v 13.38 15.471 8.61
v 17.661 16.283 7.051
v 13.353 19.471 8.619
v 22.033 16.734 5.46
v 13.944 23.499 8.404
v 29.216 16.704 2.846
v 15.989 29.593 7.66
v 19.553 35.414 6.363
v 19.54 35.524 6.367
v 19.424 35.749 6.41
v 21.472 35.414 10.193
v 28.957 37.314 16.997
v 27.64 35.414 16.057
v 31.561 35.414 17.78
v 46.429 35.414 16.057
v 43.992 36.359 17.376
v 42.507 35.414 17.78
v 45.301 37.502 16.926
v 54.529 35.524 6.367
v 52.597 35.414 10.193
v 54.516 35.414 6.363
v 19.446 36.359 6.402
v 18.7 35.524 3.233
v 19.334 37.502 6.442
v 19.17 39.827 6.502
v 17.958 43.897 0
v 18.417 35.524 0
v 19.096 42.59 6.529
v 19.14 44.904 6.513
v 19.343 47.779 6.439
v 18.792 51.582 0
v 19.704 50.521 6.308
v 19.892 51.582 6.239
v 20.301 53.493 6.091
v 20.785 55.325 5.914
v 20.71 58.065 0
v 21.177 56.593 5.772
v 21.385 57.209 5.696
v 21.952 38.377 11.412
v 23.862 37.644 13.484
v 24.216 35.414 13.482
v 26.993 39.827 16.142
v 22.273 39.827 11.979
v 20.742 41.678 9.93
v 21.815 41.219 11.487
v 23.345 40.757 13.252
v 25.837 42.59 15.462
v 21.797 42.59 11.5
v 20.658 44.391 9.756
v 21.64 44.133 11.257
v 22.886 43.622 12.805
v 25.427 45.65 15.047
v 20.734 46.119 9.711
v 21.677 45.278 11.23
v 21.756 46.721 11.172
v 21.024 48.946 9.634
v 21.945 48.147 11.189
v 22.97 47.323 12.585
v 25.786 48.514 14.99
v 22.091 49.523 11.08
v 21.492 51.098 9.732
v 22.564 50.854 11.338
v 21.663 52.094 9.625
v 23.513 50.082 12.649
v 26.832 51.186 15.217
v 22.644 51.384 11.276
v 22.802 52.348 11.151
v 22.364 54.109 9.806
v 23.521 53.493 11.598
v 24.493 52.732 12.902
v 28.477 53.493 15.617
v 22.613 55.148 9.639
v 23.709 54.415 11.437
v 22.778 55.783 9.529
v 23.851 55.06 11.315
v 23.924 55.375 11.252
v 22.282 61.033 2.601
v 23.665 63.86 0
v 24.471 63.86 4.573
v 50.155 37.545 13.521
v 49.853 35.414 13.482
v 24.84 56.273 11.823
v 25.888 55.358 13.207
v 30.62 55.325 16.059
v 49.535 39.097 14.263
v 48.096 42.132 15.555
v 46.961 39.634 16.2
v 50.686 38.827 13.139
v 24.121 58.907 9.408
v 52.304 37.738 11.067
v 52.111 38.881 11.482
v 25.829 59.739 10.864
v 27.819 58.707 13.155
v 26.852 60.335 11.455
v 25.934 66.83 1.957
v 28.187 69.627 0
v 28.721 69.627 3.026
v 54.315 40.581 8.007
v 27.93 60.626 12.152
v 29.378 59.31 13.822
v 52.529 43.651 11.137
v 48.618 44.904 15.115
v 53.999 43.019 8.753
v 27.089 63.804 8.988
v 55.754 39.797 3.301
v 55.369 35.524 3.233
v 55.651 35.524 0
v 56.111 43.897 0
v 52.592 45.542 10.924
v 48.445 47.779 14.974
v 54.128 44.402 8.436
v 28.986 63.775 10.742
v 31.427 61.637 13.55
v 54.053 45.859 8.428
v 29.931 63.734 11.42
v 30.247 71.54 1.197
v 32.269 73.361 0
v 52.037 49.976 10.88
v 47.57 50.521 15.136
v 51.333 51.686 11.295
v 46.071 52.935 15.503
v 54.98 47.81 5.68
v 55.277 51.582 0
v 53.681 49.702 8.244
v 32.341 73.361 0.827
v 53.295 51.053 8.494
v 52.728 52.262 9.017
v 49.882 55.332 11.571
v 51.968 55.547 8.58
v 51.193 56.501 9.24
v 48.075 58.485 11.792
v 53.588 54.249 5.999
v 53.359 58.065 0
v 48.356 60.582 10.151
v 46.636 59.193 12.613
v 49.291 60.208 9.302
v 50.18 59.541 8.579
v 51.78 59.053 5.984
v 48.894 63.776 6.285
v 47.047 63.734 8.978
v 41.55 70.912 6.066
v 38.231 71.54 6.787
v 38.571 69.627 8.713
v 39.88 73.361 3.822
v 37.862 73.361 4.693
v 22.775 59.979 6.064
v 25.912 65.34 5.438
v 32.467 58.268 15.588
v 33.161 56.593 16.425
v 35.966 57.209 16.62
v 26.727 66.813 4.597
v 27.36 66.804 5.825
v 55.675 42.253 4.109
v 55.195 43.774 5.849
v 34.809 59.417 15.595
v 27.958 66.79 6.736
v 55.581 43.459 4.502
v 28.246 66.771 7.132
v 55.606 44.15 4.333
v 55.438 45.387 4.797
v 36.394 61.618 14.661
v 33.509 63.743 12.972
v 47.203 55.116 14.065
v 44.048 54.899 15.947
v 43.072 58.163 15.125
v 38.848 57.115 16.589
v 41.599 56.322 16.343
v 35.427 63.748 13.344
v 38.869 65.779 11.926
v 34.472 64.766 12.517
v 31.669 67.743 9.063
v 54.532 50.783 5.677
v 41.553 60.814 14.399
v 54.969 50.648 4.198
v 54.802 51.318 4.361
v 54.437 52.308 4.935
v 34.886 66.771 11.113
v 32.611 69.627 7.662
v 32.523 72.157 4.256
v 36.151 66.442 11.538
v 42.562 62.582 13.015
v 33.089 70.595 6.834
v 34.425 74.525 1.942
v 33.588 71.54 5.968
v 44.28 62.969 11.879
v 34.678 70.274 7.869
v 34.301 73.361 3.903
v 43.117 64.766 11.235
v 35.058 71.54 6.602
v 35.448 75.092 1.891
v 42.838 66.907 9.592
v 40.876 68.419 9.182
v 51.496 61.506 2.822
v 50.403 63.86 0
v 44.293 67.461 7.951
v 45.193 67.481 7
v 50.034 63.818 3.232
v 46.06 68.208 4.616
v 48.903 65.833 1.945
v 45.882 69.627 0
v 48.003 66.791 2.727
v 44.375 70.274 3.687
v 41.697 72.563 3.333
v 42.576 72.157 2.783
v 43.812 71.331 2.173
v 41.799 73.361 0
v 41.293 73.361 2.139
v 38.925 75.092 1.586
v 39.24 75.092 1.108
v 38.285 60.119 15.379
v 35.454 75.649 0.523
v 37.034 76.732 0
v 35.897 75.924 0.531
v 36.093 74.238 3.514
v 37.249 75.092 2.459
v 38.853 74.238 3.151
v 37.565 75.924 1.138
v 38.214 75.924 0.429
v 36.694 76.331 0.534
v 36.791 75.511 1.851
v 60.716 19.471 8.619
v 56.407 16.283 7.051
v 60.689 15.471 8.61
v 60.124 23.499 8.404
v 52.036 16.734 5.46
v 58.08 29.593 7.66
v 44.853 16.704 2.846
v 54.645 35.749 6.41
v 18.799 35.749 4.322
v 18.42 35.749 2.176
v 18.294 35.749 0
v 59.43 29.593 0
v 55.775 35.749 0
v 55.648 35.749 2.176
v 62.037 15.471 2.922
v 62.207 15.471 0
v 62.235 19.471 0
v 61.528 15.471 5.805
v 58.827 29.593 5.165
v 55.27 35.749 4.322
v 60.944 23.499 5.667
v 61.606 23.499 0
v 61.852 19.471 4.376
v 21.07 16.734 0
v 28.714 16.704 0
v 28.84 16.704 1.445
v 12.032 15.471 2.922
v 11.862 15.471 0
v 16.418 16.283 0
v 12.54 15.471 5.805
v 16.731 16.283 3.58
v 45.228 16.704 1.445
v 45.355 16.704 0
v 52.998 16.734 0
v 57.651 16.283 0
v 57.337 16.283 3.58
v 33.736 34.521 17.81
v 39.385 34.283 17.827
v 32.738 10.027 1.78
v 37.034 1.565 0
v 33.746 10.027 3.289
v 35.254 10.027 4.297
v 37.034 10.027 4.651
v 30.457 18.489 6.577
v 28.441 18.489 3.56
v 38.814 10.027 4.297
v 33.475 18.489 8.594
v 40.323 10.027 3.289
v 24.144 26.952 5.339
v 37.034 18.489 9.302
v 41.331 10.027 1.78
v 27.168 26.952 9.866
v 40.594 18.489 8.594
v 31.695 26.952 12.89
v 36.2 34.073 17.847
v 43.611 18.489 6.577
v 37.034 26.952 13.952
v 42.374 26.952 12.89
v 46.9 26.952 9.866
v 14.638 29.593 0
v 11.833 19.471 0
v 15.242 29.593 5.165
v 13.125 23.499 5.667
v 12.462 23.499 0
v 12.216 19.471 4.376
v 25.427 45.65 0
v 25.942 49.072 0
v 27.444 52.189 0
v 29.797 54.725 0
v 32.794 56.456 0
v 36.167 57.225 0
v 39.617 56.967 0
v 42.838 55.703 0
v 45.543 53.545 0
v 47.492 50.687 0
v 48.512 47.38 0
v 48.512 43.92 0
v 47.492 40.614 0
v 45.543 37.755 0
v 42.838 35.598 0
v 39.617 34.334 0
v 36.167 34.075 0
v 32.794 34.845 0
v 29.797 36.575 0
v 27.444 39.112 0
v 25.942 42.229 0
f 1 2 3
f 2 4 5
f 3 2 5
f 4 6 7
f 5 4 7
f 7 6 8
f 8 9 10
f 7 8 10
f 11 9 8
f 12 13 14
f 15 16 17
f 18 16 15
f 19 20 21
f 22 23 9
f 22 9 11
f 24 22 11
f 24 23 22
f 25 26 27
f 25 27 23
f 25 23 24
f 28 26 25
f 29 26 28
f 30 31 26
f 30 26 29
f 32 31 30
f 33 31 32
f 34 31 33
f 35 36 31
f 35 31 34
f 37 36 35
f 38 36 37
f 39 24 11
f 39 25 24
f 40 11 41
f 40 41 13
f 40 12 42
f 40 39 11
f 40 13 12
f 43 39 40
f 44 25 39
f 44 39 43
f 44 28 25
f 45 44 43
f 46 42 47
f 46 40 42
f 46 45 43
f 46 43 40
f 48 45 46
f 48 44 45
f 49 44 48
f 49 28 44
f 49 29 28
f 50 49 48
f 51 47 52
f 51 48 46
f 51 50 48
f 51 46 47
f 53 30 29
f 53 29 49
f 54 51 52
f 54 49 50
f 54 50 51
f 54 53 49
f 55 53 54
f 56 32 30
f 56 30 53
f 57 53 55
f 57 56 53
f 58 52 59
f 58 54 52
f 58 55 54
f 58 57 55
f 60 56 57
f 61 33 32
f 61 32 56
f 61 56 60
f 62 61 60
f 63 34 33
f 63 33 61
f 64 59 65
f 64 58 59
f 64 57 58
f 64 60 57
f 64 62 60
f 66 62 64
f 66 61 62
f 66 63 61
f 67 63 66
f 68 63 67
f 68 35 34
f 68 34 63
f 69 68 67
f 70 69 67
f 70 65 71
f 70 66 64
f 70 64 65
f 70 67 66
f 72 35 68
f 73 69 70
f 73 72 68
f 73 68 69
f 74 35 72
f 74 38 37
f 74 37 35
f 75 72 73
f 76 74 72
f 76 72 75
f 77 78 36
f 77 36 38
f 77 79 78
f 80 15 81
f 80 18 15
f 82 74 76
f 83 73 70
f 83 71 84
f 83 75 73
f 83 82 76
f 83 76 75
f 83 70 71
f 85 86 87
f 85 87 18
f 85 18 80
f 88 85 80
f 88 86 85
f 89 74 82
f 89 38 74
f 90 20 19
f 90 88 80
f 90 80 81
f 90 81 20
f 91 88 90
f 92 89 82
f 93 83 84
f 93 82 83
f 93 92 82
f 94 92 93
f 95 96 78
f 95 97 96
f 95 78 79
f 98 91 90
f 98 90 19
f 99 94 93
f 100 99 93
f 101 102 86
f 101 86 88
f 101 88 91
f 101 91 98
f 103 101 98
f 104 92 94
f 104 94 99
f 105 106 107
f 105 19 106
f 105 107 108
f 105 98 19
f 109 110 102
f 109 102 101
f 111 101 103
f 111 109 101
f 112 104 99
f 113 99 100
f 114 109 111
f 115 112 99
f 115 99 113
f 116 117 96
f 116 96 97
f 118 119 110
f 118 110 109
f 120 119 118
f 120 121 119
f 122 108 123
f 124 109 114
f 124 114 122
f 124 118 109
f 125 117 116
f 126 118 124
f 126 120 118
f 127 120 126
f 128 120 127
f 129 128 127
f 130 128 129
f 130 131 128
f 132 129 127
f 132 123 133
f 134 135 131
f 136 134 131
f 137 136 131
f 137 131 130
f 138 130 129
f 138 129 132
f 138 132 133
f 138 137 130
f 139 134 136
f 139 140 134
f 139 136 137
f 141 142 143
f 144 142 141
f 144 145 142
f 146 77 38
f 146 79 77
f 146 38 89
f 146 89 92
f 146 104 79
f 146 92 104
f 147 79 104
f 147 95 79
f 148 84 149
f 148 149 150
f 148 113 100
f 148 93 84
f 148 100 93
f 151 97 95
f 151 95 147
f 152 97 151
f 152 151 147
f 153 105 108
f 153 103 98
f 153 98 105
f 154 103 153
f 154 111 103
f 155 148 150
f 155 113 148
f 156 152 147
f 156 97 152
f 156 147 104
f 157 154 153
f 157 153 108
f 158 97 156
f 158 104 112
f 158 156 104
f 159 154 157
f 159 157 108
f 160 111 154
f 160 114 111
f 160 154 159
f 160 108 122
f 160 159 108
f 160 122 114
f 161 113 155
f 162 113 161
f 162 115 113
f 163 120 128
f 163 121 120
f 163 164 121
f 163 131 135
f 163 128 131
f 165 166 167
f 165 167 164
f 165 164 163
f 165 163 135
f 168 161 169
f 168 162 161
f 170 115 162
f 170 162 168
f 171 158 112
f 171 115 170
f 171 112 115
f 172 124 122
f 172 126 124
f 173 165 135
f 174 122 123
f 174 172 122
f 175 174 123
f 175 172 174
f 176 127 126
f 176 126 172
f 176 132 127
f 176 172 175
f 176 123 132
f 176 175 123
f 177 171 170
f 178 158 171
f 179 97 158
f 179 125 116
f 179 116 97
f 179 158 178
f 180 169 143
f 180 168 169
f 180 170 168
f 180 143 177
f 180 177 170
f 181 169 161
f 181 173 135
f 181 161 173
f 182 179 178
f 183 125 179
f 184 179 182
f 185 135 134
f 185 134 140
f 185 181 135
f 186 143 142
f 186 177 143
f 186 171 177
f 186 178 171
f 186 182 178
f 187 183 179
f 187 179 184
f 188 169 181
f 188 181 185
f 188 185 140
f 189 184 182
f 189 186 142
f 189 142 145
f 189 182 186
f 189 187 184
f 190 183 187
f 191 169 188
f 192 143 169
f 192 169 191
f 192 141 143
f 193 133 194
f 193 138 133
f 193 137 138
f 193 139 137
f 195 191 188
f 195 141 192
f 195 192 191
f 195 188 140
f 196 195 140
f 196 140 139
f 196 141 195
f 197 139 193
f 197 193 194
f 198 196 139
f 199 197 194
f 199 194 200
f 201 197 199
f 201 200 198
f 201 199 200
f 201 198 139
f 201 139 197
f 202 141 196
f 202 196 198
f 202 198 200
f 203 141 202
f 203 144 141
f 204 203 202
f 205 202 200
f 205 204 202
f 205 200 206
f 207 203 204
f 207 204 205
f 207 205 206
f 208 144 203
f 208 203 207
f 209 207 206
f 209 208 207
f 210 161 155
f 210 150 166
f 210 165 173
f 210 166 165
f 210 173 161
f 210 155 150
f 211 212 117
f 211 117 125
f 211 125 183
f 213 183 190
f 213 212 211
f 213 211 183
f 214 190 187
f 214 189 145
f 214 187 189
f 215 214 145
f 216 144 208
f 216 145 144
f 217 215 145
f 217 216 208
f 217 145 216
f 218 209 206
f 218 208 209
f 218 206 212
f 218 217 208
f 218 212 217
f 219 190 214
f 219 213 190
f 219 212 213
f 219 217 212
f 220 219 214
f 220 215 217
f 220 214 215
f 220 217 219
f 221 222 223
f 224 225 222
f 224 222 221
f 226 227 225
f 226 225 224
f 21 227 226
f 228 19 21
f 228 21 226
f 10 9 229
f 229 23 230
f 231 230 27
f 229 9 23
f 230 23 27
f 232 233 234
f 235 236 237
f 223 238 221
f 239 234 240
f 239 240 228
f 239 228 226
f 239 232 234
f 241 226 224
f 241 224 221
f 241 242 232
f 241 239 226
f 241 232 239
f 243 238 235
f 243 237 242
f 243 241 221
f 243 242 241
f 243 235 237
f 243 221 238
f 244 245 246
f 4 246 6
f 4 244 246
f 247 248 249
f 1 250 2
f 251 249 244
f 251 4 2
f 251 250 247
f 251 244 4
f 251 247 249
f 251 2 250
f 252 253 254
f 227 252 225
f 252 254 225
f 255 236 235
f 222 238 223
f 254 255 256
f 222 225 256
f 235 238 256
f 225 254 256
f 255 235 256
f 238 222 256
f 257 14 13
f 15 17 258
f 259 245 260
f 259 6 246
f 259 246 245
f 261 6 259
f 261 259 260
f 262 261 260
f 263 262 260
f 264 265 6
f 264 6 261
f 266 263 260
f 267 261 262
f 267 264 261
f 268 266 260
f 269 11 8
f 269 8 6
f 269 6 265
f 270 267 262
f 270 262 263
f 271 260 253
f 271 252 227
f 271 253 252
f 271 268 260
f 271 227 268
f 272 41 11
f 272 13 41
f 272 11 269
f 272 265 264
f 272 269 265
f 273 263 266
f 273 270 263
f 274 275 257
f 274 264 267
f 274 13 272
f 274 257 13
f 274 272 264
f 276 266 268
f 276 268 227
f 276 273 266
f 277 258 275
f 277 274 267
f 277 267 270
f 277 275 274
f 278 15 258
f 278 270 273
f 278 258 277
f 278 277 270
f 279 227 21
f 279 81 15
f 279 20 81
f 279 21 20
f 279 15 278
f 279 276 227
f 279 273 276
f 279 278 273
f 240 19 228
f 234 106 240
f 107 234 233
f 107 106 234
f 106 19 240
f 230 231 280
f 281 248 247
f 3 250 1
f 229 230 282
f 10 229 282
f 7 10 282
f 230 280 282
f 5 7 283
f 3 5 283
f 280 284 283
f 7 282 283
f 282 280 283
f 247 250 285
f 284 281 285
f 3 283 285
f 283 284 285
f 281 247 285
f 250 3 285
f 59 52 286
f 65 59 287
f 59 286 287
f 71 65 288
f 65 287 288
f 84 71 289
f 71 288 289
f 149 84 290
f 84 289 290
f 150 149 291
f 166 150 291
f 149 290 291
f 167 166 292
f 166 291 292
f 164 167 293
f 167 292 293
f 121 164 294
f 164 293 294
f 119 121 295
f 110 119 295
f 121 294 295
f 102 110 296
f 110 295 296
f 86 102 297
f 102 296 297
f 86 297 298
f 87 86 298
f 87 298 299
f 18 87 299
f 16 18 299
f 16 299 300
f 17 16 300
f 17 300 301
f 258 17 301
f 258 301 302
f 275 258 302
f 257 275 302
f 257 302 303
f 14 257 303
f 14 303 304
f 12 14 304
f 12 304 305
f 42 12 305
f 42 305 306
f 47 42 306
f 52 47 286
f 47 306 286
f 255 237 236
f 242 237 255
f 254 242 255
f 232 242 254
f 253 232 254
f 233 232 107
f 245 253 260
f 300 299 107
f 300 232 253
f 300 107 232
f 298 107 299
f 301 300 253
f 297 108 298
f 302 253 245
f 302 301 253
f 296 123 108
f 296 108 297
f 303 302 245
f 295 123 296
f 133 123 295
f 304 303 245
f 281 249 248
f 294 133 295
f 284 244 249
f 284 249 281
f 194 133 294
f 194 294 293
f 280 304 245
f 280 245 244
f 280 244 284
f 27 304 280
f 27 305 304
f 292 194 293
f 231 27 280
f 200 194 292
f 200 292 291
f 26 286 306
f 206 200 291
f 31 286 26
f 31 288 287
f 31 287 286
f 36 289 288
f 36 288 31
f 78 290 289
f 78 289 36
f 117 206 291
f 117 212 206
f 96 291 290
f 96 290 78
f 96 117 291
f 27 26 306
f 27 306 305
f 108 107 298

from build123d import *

# Parameters (mm, degrees)
REVOLVE1_ANGLE           = 180
SKETCH2_R                = 11.607478401
CUT_EXTRUDE1_DEPTH       = 30
REVOLVE3_ANGLE           = 20
REVOLVE3_OTHER_WAY_ANGLE = 20
SKETCH6_W                = 87.695776886
SKETCH6_H                = 110.7877302
CUT_EXTRUDE2_DEPTH       = 30


with BuildPart() as part:
    # Sketch1 → Revolve1 (revolve)
    with BuildSketch(Plane.XY):
        with BuildLine():
            Line((37.03427234, 1.564642505), (18.431130492, 35.41414573))
            add(Edge.make_bspline(
                [(18.431130492, 35.41414573), (14.894772629, 62.905623644), (37.03427234, 76.73235426)],
                knots=[0, 0, 0, 1, 1, 1], degree=2))
            Line((37.03427234, 76.73235426), (37.03427234, 57.257883484))
            ThreePointArc((37.03427234, 57.257883484), (25.426793939, 45.650405083), (37.03427234, 34.042926682))
            Line((37.03427234, 34.042926682), (37.03427234, 1.564642505))
        make_face()
    revolve(axis=Axis((37.03427234, 57.257883484, 0), (0, 1, 0)), revolution_arc=REVOLVE1_ANGLE)

    # Sketch2 → Cut-Extrude1 (cut)
    with BuildSketch(Plane(origin=(0, 0, 0), x_dir=(-1, 0, 0), z_dir=(0, 0, -1))):
        with Locations((-37.03427234, 45.650405083)):
            Circle(SKETCH2_R)
    extrude(amount=-CUT_EXTRUDE1_DEPTH, mode=Mode.SUBTRACT)

    # Sketch3 → Revolve3 (revolve)
    with BuildSketch(Plane(origin=(0, 0, 0), x_dir=(-1, 0, 0), z_dir=(0, 0, -1))):
        with BuildLine():
            Line((-55.774902941, 35.7486794), (-45.306584566, 16.700962649))
            add(Edge.make_bspline(
                [(-45.306584566, 16.700962649), (-54.069804725, 17.26279972), (-62.206909853, 15.470822713)],
                knots=[0, 0, 0, 0.385925107, 0.385925107, 0.385925107], degree=2))
            add(Edge.make_bspline(
                [(-55.774902941, 35.7486794), (-63.0996884, 25.437145822), (-62.206909853, 15.470822713)],
                knots=[0, 0, 0, 0.565089792, 0.565089792, 0.565089792], degree=2))
        make_face()
        with BuildLine():
            Line((-18.293641739, 35.7486794), (-28.761960114, 16.700962649))
            add(Edge.make_bspline(
                [(-28.761960114, 16.700962649), (-19.998739955, 17.26279972), (-11.861634828, 15.470822713)],
                knots=[0, 0, 0, 0.385925107, 0.385925107, 0.385925107], degree=2))
            add(Edge.make_bspline(
                [(-18.293641739, 35.7486794), (-10.96885628, 25.437145822), (-11.861634828, 15.470822713)],
                knots=[0, 0, 0, 0.565089792, 0.565089792, 0.565089792], degree=2))
        make_face()
    revolve(axis=Axis((37.03427234, 76.73235426, 0), (0, -1, 0)), revolution_arc=REVOLVE3_ANGLE)

    # Sketch3 → Revolve3 other way (revolve)
    with BuildSketch(Plane(origin=(0, 0, 0), x_dir=(-1, 0, 0), z_dir=(0, 0, -1))):
        with BuildLine():
            Line((-55.774902941, 35.7486794), (-45.306584566, 16.700962649))
            add(Edge.make_bspline(
                [(-45.306584566, 16.700962649), (-54.069804725, 17.26279972), (-62.206909853, 15.470822713)],
                knots=[0, 0, 0, 0.385925107, 0.385925107, 0.385925107], degree=2))
            add(Edge.make_bspline(
                [(-55.774902941, 35.7486794), (-63.0996884, 25.437145822), (-62.206909853, 15.470822713)],
                knots=[0, 0, 0, 0.565089792, 0.565089792, 0.565089792], degree=2))
        make_face()
        with BuildLine():
            Line((-18.293641739, 35.7486794), (-28.761960114, 16.700962649))
            add(Edge.make_bspline(
                [(-28.761960114, 16.700962649), (-19.998739955, 17.26279972), (-11.861634828, 15.470822713)],
                knots=[0, 0, 0, 0.385925107, 0.385925107, 0.385925107], degree=2))
            add(Edge.make_bspline(
                [(-18.293641739, 35.7486794), (-10.96885628, 25.437145822), (-11.861634828, 15.470822713)],
                knots=[0, 0, 0, 0.565089792, 0.565089792, 0.565089792], degree=2))
        make_face()
    revolve(axis=Axis((37.03427234, 76.73235426, 0), (0, 1, 0)), revolution_arc=REVOLVE3_OTHER_WAY_ANGLE)

    # Sketch6 → Cut-Extrude2 (cut)
    with BuildSketch(Plane(origin=(0, 0, 0), x_dir=(-1, 0, 0), z_dir=(0, 0, -1))):
        with Locations((-37.762446628, 42.00670517)):
            Rectangle(SKETCH6_W, SKETCH6_H)
    extrude(amount=CUT_EXTRUDE2_DEPTH, mode=Mode.SUBTRACT)


solid = part.part
